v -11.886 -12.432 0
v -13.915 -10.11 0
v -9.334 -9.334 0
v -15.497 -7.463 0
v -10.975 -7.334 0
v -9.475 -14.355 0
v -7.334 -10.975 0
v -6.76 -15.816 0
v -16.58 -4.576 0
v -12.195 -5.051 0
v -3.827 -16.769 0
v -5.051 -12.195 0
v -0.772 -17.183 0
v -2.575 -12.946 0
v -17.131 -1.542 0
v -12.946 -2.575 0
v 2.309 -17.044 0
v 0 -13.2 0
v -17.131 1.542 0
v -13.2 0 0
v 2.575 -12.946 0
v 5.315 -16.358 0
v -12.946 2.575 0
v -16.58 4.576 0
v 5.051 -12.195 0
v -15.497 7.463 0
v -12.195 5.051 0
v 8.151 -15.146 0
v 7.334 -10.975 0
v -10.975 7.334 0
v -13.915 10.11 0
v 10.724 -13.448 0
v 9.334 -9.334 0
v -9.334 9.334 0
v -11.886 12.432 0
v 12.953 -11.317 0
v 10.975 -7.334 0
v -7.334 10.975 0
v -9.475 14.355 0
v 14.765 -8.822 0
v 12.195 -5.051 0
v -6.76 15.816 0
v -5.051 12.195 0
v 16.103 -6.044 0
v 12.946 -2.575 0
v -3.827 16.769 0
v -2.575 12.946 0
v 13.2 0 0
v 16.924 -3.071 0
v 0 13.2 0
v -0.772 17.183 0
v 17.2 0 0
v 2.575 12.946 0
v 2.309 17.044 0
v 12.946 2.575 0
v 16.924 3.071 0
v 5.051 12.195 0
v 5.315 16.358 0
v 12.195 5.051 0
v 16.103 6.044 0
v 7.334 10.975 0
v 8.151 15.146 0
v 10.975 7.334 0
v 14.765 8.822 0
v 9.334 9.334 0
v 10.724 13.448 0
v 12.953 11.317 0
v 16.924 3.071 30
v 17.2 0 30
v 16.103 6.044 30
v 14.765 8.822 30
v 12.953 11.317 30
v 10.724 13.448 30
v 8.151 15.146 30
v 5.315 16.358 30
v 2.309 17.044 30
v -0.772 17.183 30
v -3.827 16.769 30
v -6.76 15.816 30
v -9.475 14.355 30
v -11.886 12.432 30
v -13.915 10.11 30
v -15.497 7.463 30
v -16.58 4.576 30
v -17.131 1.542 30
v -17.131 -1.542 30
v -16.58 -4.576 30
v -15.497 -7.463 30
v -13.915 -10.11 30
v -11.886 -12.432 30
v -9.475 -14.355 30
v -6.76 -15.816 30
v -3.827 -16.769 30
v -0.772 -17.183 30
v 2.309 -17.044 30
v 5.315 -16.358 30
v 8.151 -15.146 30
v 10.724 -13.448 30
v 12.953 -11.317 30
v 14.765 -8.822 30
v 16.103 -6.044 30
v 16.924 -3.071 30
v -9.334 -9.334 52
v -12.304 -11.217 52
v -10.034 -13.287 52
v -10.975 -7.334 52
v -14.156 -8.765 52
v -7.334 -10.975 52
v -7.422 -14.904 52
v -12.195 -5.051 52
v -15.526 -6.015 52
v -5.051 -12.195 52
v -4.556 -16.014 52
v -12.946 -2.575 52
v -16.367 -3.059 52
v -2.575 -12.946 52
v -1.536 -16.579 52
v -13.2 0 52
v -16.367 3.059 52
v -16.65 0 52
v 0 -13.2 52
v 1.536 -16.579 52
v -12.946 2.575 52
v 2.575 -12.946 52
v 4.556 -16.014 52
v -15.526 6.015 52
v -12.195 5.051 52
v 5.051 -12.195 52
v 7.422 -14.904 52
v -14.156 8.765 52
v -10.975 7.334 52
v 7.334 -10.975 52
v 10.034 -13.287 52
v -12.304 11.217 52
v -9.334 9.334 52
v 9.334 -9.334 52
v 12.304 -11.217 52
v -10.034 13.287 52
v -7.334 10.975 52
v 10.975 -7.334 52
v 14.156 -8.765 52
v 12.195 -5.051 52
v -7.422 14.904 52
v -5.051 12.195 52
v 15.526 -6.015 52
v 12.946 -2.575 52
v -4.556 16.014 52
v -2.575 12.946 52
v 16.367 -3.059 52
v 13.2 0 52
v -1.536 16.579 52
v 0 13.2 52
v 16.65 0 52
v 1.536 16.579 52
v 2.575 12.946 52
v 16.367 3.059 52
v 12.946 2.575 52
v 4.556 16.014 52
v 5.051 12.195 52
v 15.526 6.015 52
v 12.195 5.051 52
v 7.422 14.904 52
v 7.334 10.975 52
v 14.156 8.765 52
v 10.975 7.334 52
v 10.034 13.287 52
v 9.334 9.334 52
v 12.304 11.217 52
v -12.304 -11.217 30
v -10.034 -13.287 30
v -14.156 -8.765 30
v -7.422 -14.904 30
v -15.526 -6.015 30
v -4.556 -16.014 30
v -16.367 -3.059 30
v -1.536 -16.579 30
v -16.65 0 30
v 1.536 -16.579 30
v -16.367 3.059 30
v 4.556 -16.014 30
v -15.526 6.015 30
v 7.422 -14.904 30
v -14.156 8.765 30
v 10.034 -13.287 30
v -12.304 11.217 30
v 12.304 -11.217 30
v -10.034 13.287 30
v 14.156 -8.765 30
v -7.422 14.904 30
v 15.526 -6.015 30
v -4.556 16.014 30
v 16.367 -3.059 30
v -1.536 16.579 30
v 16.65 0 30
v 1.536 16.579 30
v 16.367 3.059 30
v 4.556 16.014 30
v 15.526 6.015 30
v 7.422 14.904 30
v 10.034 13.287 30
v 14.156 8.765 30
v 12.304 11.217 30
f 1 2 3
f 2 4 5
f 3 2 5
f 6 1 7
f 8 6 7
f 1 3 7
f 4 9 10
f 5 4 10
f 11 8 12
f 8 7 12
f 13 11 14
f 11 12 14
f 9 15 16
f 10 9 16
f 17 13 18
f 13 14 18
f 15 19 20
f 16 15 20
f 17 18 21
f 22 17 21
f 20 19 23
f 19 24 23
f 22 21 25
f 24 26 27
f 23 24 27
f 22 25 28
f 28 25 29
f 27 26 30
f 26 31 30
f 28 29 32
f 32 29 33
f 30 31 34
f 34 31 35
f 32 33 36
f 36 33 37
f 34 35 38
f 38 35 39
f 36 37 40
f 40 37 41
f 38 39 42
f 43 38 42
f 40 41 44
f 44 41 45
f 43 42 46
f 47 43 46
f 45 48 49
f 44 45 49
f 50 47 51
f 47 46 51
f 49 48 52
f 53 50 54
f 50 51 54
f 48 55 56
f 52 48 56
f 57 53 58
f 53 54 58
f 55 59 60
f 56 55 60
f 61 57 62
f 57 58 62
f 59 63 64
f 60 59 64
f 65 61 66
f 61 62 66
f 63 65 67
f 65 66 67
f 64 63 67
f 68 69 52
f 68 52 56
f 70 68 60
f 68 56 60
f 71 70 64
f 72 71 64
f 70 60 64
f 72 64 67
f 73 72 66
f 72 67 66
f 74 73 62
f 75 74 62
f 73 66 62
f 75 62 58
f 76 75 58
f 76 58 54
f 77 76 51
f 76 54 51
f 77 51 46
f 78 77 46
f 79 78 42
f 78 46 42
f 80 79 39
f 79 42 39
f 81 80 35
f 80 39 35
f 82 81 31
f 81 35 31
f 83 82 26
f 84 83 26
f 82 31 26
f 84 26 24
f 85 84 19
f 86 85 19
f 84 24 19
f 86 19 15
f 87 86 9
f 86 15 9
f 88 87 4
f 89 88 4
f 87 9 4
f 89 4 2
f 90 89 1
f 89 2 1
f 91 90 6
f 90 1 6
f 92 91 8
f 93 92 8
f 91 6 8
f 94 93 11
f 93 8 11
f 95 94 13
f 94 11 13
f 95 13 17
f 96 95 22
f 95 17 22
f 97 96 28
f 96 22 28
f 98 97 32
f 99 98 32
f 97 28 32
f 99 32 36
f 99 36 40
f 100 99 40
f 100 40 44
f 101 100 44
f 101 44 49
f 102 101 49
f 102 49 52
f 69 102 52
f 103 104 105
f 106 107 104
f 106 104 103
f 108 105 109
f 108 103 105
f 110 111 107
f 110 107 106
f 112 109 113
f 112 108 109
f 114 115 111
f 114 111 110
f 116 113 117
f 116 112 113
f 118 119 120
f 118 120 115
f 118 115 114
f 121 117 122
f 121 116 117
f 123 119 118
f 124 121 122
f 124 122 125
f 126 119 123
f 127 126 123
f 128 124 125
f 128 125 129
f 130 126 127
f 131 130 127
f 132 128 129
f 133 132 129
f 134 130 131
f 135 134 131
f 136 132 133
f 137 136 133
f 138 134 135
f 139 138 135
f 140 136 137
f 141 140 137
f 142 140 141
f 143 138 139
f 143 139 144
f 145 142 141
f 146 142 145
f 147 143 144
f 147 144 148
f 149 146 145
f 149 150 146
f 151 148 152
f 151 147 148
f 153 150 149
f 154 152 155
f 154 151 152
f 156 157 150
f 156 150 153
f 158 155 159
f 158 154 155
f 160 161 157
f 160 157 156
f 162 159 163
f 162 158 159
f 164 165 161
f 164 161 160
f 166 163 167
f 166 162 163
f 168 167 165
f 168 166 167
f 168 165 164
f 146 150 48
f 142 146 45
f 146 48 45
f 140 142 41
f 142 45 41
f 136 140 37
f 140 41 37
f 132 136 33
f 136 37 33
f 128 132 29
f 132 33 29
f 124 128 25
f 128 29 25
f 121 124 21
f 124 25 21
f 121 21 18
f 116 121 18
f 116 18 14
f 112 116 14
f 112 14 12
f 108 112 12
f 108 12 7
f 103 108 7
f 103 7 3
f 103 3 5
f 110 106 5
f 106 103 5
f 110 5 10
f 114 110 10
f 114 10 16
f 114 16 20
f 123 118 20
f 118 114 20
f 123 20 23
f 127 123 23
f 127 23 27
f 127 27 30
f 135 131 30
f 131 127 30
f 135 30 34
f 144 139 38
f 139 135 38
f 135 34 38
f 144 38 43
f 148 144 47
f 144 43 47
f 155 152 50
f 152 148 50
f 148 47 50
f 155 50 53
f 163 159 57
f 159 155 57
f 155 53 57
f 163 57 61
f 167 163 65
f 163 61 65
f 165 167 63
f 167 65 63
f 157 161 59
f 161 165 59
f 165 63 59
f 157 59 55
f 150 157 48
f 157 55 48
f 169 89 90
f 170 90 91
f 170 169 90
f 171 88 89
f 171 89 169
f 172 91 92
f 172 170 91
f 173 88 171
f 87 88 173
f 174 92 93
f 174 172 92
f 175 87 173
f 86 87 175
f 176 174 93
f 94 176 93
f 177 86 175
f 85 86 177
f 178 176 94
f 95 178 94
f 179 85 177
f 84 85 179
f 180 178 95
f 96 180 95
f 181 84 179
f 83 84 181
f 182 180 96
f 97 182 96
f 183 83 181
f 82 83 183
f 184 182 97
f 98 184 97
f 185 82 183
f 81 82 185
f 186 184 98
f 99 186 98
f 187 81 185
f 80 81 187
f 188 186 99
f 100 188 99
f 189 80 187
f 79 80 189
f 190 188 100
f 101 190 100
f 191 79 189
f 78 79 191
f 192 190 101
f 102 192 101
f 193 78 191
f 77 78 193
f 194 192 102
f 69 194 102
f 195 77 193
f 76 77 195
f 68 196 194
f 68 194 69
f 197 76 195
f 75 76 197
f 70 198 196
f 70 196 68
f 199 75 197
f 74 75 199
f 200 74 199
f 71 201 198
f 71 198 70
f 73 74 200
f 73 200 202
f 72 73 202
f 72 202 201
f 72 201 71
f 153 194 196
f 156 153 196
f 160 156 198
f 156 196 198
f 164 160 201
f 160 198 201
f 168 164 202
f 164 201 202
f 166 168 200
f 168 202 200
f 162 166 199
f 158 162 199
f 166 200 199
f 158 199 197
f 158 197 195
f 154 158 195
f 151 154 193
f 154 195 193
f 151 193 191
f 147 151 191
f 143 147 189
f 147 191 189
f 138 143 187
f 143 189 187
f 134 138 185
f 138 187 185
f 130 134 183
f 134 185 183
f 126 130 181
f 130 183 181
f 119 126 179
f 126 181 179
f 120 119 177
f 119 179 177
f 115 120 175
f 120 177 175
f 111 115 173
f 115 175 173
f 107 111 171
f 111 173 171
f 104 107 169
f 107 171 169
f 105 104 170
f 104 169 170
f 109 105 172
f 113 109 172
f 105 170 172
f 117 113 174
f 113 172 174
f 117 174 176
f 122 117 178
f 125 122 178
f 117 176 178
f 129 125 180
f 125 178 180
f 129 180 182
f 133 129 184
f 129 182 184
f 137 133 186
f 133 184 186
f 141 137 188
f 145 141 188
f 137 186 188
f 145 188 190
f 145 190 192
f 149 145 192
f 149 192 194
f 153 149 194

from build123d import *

# Parameters (mm, degrees)
F0_R     = 17.2
F1_DEPTH = 30
F2_R     = 16.65
F3_DEPTH = 22
F4_R     = 13.2
F5_DEPTH = 25
F6_R     = 13.2
F7_DEPTH = 30


with BuildPart() as f1:
    # F0 (on Top) → F1 (new body)
    with BuildSketch(Plane.XY):
        Circle(F0_R)
    extrude(amount=F1_DEPTH)

    # F2 (on face) → F3 (join)
    with BuildSketch(Plane.XY.offset(30)):
        Circle(F2_R)
    extrude(amount=F3_DEPTH)

    # F4 (on face) → F5 (cut)
    with BuildSketch(Plane.XY.offset(52)):
        Circle(F4_R)
    extrude(amount=-F5_DEPTH, mode=Mode.SUBTRACT)

    # F6 (on face) → F7 (cut)
    with BuildSketch(Plane(origin=(0, 0, 0), x_dir=(1, 0, 0), z_dir=(0, 0, -1))):
        Circle(F6_R)
    extrude(amount=-F7_DEPTH, mode=Mode.SUBTRACT)


solid = f1.part
